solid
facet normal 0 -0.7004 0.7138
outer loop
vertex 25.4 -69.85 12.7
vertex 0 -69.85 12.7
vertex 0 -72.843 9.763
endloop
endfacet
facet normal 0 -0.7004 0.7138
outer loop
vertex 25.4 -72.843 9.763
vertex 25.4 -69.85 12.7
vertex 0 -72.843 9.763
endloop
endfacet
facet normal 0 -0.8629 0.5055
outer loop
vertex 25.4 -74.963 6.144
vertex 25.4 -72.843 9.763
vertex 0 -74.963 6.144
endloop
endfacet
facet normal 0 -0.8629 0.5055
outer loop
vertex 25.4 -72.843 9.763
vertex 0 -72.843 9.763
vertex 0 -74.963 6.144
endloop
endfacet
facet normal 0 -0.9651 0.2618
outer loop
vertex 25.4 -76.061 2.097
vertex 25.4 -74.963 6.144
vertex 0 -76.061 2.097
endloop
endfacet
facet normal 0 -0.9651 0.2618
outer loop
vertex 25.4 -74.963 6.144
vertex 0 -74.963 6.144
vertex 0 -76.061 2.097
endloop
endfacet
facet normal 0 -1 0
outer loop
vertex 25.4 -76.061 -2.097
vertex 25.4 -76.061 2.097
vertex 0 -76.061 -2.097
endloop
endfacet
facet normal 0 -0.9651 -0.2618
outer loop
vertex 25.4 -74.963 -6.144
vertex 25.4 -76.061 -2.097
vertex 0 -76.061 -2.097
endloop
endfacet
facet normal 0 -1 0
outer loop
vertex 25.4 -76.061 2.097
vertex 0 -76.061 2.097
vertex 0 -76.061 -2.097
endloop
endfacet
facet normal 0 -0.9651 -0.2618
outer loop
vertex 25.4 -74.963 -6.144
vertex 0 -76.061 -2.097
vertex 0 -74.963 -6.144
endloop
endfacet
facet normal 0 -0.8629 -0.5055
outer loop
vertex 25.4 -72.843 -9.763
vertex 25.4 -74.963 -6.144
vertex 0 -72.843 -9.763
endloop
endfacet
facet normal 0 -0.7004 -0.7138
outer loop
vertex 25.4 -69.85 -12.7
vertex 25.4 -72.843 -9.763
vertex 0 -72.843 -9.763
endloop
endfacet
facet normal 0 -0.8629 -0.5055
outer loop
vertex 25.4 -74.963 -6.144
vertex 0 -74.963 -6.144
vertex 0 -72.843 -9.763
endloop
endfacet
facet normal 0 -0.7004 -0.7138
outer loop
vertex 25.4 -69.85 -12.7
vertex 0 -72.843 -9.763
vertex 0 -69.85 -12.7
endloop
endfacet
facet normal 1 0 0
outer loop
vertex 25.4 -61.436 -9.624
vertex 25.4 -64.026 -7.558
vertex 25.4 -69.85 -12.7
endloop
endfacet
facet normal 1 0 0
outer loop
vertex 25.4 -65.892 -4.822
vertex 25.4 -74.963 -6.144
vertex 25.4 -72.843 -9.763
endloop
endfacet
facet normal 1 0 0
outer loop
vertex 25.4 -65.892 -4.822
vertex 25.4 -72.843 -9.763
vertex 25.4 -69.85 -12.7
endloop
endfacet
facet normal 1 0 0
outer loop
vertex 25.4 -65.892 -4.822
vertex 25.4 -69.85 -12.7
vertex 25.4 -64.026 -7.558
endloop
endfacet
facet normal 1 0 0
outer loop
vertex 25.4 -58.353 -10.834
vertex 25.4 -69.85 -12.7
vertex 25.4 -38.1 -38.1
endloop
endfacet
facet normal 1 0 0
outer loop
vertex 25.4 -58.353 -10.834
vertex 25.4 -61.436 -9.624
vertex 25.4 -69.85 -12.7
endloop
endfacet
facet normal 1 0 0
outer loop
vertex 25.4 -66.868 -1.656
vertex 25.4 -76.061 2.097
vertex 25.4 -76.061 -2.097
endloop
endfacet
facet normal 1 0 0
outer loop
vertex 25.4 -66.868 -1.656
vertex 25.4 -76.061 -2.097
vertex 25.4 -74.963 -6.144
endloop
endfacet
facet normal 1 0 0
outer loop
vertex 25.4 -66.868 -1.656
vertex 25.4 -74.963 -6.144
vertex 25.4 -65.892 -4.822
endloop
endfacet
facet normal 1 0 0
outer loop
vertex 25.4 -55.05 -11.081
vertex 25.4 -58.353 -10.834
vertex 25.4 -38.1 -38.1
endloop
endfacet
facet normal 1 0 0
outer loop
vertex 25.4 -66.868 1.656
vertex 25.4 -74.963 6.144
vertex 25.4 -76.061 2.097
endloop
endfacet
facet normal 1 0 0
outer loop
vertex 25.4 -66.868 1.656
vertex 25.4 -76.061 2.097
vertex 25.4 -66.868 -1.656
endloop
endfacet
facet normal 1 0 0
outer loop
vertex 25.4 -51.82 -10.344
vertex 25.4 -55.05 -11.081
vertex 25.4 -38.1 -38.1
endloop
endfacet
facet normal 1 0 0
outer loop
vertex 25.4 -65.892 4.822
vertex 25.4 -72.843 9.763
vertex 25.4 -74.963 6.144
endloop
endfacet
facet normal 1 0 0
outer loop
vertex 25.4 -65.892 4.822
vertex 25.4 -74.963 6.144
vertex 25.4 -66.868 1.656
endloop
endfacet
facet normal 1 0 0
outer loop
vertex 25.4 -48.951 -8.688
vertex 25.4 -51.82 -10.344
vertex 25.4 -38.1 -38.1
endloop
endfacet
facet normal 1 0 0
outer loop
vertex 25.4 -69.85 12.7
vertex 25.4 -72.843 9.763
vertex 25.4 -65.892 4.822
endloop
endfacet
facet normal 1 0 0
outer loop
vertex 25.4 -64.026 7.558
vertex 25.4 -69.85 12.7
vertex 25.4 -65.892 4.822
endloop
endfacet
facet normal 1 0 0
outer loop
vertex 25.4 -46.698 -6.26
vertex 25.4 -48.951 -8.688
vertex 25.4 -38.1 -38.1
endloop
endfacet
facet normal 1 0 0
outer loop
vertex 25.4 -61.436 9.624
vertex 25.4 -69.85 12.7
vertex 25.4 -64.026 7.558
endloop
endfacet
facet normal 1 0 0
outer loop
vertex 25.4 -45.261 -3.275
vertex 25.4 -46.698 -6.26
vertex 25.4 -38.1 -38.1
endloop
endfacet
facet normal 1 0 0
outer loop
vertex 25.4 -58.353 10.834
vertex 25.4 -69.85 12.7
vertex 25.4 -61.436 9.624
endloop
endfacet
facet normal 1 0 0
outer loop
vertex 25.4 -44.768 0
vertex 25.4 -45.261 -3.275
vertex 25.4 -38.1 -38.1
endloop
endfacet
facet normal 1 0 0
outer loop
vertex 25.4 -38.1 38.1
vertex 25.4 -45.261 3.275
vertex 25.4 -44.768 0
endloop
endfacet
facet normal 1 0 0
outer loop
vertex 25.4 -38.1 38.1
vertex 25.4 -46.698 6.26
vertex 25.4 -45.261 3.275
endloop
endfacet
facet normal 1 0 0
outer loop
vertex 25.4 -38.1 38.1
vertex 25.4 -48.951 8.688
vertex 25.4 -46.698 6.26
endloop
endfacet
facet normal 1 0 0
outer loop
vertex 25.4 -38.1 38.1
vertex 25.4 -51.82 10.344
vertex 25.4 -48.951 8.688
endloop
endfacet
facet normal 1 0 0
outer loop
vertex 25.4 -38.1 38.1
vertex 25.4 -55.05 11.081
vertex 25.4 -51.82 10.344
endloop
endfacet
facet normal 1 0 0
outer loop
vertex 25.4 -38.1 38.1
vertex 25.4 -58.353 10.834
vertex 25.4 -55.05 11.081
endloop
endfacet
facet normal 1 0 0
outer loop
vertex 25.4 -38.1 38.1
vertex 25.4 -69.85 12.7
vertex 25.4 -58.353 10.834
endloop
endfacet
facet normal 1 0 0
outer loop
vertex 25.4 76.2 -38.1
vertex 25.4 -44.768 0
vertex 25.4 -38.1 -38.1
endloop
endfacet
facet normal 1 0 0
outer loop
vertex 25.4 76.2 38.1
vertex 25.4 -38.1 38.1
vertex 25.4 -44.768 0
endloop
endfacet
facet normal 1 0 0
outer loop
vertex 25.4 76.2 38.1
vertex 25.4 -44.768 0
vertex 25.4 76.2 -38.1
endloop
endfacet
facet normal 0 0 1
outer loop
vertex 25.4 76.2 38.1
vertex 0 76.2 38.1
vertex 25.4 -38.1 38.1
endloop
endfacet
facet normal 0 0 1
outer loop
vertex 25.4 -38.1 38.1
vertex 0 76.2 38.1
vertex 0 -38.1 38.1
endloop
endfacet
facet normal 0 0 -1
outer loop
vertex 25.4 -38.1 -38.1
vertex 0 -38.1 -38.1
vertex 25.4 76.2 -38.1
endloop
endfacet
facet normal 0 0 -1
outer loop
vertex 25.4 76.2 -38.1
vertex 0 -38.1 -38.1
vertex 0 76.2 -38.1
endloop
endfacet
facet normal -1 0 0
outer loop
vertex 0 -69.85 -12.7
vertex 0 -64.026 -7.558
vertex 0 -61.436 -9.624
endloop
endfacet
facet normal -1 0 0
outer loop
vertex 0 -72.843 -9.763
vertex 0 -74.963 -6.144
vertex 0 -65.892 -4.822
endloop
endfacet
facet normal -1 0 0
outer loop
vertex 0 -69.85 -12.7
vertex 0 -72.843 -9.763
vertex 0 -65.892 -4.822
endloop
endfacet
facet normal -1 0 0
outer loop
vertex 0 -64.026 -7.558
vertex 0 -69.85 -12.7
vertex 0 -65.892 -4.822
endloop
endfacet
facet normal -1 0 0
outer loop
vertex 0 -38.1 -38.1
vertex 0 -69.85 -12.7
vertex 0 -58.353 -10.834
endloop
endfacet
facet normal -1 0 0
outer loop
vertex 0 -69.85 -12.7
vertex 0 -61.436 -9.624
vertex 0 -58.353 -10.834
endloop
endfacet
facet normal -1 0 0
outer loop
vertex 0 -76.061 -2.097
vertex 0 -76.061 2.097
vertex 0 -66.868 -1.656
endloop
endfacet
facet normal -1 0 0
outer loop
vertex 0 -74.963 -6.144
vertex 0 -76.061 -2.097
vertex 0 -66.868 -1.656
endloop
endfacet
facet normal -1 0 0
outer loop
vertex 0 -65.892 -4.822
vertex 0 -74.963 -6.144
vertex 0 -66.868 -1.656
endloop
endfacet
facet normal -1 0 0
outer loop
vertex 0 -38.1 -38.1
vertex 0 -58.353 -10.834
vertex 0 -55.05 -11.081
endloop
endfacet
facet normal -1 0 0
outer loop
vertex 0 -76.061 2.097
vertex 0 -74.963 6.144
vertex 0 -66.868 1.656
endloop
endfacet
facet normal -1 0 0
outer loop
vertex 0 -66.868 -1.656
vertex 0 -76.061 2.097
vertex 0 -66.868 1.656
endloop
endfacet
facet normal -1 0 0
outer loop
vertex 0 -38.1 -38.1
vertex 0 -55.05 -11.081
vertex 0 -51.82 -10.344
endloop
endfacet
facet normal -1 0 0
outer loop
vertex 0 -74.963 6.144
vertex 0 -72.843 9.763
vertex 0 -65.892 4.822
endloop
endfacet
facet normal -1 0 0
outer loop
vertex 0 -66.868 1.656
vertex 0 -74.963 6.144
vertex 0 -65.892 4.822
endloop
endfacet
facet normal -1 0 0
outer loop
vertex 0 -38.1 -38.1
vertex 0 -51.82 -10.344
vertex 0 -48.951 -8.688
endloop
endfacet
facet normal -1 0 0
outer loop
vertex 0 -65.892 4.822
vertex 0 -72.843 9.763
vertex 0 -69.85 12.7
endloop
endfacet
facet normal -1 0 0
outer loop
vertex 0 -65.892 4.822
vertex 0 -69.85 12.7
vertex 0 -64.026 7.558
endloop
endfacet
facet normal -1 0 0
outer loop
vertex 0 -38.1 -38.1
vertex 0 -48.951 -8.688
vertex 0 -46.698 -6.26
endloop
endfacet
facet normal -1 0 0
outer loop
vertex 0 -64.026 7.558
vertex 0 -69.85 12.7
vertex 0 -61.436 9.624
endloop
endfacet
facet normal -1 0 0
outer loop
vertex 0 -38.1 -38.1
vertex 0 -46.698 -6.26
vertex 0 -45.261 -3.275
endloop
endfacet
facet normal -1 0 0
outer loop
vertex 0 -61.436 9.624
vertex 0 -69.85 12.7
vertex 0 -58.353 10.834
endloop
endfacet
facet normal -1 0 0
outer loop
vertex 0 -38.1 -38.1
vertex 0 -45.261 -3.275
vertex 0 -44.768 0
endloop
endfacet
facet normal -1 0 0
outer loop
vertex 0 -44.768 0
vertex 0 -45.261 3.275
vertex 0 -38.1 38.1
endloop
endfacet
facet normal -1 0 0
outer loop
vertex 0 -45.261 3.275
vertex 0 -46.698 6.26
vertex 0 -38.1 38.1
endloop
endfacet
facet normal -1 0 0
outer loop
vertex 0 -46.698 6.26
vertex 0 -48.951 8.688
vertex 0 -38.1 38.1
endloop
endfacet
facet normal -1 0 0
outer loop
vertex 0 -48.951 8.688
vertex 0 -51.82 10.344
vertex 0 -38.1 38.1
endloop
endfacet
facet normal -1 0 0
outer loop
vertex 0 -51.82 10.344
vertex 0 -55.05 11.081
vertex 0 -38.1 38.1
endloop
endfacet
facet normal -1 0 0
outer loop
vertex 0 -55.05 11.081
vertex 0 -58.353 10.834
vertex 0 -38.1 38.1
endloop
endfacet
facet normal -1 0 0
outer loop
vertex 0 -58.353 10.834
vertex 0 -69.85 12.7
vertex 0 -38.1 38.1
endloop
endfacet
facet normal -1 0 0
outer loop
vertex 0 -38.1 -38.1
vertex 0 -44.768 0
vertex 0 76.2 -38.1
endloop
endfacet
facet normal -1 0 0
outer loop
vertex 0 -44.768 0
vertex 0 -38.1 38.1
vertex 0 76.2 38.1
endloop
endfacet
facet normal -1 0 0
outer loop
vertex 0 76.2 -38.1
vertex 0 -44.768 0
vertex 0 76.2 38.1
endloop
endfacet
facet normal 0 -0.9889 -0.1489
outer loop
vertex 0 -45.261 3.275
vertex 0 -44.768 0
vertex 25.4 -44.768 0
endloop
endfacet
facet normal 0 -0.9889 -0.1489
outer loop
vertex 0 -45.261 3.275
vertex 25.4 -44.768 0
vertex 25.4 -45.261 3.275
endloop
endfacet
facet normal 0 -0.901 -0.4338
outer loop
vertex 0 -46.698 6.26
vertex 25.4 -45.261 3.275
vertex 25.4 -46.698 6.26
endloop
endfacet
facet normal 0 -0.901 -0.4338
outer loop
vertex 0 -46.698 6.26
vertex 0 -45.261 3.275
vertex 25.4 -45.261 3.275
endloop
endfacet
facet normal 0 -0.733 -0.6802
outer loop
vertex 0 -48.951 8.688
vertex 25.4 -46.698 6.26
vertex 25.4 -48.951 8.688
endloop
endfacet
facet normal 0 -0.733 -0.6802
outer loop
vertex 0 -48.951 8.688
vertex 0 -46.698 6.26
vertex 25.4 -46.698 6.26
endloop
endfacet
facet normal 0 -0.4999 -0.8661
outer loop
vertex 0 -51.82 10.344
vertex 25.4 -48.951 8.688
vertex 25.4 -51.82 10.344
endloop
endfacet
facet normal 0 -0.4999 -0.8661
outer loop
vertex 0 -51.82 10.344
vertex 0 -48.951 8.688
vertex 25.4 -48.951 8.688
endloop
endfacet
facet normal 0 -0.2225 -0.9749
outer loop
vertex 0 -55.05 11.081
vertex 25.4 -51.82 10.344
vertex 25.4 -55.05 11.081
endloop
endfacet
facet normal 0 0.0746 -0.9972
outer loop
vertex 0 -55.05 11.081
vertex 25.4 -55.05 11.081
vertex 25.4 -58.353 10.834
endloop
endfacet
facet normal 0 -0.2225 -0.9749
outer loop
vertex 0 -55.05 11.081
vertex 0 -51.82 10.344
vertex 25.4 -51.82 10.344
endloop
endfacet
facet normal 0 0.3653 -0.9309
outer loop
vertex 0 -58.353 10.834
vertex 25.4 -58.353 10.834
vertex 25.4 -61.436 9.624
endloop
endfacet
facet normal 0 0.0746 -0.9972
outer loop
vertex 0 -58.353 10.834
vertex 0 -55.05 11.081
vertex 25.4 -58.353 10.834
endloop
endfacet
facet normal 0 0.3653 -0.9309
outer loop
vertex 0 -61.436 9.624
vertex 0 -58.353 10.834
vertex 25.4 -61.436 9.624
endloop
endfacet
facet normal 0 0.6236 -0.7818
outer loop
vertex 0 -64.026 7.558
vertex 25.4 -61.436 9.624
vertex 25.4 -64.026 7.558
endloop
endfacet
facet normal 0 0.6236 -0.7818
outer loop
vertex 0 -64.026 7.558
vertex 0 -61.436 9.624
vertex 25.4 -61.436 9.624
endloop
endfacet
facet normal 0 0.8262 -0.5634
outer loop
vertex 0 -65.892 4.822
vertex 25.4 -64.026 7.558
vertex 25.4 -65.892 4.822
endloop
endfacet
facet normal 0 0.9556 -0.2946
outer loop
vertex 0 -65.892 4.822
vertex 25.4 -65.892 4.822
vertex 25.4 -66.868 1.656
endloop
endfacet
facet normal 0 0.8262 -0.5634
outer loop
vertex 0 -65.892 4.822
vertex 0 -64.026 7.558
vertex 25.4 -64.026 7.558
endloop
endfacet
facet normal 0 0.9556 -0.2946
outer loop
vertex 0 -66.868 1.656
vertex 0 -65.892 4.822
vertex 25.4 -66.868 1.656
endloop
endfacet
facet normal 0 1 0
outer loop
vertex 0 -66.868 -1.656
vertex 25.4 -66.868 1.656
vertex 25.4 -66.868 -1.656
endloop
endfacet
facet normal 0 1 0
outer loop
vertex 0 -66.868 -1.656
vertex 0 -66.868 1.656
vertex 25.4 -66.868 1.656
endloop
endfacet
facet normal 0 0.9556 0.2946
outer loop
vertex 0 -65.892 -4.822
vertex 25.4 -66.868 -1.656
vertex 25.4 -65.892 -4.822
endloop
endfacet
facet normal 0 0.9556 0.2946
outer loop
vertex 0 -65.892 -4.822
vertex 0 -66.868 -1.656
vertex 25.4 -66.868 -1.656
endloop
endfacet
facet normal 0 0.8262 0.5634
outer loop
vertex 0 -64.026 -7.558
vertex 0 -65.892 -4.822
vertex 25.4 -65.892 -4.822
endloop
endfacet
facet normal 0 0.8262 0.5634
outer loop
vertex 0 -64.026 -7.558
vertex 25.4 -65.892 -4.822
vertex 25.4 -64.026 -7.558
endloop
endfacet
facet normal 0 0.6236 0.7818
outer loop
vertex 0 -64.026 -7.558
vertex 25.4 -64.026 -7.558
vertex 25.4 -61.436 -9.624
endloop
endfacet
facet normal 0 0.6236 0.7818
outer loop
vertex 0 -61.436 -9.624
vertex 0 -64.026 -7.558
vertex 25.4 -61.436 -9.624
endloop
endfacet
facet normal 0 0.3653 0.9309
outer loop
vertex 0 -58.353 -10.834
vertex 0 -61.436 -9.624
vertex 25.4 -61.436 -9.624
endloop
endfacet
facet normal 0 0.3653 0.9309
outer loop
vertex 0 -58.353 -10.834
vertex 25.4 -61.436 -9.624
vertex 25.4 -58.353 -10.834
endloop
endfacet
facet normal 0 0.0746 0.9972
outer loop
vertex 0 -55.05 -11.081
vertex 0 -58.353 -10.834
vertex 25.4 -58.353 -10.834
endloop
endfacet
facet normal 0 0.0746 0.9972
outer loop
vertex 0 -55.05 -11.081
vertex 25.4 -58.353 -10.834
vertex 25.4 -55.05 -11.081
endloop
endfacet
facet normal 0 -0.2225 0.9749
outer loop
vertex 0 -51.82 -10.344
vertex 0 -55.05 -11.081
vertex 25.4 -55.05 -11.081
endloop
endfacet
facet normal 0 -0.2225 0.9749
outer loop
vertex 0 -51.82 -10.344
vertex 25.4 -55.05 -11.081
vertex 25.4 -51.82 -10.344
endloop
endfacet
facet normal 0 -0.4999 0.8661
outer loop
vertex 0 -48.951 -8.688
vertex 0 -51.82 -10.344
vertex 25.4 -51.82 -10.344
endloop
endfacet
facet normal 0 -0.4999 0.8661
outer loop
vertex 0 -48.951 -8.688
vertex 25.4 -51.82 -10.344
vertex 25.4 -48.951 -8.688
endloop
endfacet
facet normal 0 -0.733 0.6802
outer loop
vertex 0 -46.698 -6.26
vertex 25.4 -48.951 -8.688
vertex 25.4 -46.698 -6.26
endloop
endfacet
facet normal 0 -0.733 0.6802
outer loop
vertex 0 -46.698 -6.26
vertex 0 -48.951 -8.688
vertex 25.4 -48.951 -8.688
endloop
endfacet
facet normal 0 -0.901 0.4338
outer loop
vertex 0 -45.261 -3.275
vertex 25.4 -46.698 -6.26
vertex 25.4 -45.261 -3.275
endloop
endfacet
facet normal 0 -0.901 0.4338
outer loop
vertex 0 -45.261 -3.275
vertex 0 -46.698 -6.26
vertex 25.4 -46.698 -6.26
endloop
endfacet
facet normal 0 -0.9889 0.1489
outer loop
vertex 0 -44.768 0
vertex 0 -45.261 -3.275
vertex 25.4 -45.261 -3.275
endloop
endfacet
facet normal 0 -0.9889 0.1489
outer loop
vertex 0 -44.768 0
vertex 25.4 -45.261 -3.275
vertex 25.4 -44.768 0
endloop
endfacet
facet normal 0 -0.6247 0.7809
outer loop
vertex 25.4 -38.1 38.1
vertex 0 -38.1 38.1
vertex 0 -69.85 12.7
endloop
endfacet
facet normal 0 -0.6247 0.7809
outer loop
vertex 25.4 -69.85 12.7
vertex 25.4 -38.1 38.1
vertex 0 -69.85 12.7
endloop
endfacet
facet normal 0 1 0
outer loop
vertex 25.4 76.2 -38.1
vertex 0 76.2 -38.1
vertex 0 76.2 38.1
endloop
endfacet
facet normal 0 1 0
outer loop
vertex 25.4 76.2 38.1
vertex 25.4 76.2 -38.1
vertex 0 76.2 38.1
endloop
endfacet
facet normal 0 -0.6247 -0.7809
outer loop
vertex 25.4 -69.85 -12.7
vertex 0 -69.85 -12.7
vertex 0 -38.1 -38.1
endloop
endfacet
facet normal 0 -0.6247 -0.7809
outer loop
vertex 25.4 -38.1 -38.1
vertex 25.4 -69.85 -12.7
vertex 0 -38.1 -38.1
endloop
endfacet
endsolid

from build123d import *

# Parameters (mm, degrees)
F0_R     = 11.1125
F1_DEPTH = 25.4


with BuildPart() as f1:
    # F0 (on Right) → F1 (new body)
    with BuildSketch(Plane.YZ):
        with BuildLine():
            Line((76.2, 38.1), (-38.1, 38.1))
            Line((-38.1, 38.1), (-69.85, 12.7))
            ThreePointArc((-69.85, 12.7), (-76.2, 0), (-69.85, -12.7))
            Line((-69.85, -12.7), (-38.1, -38.1))
            Line((-38.1, -38.1), (76.2, -38.1))
            Line((76.2, -38.1), (76.2, 38.1))
        make_face()
        with Locations((-55.88, 0)):
            Circle(F0_R, mode=Mode.SUBTRACT)
    extrude(amount=F1_DEPTH)


solid = f1.part
